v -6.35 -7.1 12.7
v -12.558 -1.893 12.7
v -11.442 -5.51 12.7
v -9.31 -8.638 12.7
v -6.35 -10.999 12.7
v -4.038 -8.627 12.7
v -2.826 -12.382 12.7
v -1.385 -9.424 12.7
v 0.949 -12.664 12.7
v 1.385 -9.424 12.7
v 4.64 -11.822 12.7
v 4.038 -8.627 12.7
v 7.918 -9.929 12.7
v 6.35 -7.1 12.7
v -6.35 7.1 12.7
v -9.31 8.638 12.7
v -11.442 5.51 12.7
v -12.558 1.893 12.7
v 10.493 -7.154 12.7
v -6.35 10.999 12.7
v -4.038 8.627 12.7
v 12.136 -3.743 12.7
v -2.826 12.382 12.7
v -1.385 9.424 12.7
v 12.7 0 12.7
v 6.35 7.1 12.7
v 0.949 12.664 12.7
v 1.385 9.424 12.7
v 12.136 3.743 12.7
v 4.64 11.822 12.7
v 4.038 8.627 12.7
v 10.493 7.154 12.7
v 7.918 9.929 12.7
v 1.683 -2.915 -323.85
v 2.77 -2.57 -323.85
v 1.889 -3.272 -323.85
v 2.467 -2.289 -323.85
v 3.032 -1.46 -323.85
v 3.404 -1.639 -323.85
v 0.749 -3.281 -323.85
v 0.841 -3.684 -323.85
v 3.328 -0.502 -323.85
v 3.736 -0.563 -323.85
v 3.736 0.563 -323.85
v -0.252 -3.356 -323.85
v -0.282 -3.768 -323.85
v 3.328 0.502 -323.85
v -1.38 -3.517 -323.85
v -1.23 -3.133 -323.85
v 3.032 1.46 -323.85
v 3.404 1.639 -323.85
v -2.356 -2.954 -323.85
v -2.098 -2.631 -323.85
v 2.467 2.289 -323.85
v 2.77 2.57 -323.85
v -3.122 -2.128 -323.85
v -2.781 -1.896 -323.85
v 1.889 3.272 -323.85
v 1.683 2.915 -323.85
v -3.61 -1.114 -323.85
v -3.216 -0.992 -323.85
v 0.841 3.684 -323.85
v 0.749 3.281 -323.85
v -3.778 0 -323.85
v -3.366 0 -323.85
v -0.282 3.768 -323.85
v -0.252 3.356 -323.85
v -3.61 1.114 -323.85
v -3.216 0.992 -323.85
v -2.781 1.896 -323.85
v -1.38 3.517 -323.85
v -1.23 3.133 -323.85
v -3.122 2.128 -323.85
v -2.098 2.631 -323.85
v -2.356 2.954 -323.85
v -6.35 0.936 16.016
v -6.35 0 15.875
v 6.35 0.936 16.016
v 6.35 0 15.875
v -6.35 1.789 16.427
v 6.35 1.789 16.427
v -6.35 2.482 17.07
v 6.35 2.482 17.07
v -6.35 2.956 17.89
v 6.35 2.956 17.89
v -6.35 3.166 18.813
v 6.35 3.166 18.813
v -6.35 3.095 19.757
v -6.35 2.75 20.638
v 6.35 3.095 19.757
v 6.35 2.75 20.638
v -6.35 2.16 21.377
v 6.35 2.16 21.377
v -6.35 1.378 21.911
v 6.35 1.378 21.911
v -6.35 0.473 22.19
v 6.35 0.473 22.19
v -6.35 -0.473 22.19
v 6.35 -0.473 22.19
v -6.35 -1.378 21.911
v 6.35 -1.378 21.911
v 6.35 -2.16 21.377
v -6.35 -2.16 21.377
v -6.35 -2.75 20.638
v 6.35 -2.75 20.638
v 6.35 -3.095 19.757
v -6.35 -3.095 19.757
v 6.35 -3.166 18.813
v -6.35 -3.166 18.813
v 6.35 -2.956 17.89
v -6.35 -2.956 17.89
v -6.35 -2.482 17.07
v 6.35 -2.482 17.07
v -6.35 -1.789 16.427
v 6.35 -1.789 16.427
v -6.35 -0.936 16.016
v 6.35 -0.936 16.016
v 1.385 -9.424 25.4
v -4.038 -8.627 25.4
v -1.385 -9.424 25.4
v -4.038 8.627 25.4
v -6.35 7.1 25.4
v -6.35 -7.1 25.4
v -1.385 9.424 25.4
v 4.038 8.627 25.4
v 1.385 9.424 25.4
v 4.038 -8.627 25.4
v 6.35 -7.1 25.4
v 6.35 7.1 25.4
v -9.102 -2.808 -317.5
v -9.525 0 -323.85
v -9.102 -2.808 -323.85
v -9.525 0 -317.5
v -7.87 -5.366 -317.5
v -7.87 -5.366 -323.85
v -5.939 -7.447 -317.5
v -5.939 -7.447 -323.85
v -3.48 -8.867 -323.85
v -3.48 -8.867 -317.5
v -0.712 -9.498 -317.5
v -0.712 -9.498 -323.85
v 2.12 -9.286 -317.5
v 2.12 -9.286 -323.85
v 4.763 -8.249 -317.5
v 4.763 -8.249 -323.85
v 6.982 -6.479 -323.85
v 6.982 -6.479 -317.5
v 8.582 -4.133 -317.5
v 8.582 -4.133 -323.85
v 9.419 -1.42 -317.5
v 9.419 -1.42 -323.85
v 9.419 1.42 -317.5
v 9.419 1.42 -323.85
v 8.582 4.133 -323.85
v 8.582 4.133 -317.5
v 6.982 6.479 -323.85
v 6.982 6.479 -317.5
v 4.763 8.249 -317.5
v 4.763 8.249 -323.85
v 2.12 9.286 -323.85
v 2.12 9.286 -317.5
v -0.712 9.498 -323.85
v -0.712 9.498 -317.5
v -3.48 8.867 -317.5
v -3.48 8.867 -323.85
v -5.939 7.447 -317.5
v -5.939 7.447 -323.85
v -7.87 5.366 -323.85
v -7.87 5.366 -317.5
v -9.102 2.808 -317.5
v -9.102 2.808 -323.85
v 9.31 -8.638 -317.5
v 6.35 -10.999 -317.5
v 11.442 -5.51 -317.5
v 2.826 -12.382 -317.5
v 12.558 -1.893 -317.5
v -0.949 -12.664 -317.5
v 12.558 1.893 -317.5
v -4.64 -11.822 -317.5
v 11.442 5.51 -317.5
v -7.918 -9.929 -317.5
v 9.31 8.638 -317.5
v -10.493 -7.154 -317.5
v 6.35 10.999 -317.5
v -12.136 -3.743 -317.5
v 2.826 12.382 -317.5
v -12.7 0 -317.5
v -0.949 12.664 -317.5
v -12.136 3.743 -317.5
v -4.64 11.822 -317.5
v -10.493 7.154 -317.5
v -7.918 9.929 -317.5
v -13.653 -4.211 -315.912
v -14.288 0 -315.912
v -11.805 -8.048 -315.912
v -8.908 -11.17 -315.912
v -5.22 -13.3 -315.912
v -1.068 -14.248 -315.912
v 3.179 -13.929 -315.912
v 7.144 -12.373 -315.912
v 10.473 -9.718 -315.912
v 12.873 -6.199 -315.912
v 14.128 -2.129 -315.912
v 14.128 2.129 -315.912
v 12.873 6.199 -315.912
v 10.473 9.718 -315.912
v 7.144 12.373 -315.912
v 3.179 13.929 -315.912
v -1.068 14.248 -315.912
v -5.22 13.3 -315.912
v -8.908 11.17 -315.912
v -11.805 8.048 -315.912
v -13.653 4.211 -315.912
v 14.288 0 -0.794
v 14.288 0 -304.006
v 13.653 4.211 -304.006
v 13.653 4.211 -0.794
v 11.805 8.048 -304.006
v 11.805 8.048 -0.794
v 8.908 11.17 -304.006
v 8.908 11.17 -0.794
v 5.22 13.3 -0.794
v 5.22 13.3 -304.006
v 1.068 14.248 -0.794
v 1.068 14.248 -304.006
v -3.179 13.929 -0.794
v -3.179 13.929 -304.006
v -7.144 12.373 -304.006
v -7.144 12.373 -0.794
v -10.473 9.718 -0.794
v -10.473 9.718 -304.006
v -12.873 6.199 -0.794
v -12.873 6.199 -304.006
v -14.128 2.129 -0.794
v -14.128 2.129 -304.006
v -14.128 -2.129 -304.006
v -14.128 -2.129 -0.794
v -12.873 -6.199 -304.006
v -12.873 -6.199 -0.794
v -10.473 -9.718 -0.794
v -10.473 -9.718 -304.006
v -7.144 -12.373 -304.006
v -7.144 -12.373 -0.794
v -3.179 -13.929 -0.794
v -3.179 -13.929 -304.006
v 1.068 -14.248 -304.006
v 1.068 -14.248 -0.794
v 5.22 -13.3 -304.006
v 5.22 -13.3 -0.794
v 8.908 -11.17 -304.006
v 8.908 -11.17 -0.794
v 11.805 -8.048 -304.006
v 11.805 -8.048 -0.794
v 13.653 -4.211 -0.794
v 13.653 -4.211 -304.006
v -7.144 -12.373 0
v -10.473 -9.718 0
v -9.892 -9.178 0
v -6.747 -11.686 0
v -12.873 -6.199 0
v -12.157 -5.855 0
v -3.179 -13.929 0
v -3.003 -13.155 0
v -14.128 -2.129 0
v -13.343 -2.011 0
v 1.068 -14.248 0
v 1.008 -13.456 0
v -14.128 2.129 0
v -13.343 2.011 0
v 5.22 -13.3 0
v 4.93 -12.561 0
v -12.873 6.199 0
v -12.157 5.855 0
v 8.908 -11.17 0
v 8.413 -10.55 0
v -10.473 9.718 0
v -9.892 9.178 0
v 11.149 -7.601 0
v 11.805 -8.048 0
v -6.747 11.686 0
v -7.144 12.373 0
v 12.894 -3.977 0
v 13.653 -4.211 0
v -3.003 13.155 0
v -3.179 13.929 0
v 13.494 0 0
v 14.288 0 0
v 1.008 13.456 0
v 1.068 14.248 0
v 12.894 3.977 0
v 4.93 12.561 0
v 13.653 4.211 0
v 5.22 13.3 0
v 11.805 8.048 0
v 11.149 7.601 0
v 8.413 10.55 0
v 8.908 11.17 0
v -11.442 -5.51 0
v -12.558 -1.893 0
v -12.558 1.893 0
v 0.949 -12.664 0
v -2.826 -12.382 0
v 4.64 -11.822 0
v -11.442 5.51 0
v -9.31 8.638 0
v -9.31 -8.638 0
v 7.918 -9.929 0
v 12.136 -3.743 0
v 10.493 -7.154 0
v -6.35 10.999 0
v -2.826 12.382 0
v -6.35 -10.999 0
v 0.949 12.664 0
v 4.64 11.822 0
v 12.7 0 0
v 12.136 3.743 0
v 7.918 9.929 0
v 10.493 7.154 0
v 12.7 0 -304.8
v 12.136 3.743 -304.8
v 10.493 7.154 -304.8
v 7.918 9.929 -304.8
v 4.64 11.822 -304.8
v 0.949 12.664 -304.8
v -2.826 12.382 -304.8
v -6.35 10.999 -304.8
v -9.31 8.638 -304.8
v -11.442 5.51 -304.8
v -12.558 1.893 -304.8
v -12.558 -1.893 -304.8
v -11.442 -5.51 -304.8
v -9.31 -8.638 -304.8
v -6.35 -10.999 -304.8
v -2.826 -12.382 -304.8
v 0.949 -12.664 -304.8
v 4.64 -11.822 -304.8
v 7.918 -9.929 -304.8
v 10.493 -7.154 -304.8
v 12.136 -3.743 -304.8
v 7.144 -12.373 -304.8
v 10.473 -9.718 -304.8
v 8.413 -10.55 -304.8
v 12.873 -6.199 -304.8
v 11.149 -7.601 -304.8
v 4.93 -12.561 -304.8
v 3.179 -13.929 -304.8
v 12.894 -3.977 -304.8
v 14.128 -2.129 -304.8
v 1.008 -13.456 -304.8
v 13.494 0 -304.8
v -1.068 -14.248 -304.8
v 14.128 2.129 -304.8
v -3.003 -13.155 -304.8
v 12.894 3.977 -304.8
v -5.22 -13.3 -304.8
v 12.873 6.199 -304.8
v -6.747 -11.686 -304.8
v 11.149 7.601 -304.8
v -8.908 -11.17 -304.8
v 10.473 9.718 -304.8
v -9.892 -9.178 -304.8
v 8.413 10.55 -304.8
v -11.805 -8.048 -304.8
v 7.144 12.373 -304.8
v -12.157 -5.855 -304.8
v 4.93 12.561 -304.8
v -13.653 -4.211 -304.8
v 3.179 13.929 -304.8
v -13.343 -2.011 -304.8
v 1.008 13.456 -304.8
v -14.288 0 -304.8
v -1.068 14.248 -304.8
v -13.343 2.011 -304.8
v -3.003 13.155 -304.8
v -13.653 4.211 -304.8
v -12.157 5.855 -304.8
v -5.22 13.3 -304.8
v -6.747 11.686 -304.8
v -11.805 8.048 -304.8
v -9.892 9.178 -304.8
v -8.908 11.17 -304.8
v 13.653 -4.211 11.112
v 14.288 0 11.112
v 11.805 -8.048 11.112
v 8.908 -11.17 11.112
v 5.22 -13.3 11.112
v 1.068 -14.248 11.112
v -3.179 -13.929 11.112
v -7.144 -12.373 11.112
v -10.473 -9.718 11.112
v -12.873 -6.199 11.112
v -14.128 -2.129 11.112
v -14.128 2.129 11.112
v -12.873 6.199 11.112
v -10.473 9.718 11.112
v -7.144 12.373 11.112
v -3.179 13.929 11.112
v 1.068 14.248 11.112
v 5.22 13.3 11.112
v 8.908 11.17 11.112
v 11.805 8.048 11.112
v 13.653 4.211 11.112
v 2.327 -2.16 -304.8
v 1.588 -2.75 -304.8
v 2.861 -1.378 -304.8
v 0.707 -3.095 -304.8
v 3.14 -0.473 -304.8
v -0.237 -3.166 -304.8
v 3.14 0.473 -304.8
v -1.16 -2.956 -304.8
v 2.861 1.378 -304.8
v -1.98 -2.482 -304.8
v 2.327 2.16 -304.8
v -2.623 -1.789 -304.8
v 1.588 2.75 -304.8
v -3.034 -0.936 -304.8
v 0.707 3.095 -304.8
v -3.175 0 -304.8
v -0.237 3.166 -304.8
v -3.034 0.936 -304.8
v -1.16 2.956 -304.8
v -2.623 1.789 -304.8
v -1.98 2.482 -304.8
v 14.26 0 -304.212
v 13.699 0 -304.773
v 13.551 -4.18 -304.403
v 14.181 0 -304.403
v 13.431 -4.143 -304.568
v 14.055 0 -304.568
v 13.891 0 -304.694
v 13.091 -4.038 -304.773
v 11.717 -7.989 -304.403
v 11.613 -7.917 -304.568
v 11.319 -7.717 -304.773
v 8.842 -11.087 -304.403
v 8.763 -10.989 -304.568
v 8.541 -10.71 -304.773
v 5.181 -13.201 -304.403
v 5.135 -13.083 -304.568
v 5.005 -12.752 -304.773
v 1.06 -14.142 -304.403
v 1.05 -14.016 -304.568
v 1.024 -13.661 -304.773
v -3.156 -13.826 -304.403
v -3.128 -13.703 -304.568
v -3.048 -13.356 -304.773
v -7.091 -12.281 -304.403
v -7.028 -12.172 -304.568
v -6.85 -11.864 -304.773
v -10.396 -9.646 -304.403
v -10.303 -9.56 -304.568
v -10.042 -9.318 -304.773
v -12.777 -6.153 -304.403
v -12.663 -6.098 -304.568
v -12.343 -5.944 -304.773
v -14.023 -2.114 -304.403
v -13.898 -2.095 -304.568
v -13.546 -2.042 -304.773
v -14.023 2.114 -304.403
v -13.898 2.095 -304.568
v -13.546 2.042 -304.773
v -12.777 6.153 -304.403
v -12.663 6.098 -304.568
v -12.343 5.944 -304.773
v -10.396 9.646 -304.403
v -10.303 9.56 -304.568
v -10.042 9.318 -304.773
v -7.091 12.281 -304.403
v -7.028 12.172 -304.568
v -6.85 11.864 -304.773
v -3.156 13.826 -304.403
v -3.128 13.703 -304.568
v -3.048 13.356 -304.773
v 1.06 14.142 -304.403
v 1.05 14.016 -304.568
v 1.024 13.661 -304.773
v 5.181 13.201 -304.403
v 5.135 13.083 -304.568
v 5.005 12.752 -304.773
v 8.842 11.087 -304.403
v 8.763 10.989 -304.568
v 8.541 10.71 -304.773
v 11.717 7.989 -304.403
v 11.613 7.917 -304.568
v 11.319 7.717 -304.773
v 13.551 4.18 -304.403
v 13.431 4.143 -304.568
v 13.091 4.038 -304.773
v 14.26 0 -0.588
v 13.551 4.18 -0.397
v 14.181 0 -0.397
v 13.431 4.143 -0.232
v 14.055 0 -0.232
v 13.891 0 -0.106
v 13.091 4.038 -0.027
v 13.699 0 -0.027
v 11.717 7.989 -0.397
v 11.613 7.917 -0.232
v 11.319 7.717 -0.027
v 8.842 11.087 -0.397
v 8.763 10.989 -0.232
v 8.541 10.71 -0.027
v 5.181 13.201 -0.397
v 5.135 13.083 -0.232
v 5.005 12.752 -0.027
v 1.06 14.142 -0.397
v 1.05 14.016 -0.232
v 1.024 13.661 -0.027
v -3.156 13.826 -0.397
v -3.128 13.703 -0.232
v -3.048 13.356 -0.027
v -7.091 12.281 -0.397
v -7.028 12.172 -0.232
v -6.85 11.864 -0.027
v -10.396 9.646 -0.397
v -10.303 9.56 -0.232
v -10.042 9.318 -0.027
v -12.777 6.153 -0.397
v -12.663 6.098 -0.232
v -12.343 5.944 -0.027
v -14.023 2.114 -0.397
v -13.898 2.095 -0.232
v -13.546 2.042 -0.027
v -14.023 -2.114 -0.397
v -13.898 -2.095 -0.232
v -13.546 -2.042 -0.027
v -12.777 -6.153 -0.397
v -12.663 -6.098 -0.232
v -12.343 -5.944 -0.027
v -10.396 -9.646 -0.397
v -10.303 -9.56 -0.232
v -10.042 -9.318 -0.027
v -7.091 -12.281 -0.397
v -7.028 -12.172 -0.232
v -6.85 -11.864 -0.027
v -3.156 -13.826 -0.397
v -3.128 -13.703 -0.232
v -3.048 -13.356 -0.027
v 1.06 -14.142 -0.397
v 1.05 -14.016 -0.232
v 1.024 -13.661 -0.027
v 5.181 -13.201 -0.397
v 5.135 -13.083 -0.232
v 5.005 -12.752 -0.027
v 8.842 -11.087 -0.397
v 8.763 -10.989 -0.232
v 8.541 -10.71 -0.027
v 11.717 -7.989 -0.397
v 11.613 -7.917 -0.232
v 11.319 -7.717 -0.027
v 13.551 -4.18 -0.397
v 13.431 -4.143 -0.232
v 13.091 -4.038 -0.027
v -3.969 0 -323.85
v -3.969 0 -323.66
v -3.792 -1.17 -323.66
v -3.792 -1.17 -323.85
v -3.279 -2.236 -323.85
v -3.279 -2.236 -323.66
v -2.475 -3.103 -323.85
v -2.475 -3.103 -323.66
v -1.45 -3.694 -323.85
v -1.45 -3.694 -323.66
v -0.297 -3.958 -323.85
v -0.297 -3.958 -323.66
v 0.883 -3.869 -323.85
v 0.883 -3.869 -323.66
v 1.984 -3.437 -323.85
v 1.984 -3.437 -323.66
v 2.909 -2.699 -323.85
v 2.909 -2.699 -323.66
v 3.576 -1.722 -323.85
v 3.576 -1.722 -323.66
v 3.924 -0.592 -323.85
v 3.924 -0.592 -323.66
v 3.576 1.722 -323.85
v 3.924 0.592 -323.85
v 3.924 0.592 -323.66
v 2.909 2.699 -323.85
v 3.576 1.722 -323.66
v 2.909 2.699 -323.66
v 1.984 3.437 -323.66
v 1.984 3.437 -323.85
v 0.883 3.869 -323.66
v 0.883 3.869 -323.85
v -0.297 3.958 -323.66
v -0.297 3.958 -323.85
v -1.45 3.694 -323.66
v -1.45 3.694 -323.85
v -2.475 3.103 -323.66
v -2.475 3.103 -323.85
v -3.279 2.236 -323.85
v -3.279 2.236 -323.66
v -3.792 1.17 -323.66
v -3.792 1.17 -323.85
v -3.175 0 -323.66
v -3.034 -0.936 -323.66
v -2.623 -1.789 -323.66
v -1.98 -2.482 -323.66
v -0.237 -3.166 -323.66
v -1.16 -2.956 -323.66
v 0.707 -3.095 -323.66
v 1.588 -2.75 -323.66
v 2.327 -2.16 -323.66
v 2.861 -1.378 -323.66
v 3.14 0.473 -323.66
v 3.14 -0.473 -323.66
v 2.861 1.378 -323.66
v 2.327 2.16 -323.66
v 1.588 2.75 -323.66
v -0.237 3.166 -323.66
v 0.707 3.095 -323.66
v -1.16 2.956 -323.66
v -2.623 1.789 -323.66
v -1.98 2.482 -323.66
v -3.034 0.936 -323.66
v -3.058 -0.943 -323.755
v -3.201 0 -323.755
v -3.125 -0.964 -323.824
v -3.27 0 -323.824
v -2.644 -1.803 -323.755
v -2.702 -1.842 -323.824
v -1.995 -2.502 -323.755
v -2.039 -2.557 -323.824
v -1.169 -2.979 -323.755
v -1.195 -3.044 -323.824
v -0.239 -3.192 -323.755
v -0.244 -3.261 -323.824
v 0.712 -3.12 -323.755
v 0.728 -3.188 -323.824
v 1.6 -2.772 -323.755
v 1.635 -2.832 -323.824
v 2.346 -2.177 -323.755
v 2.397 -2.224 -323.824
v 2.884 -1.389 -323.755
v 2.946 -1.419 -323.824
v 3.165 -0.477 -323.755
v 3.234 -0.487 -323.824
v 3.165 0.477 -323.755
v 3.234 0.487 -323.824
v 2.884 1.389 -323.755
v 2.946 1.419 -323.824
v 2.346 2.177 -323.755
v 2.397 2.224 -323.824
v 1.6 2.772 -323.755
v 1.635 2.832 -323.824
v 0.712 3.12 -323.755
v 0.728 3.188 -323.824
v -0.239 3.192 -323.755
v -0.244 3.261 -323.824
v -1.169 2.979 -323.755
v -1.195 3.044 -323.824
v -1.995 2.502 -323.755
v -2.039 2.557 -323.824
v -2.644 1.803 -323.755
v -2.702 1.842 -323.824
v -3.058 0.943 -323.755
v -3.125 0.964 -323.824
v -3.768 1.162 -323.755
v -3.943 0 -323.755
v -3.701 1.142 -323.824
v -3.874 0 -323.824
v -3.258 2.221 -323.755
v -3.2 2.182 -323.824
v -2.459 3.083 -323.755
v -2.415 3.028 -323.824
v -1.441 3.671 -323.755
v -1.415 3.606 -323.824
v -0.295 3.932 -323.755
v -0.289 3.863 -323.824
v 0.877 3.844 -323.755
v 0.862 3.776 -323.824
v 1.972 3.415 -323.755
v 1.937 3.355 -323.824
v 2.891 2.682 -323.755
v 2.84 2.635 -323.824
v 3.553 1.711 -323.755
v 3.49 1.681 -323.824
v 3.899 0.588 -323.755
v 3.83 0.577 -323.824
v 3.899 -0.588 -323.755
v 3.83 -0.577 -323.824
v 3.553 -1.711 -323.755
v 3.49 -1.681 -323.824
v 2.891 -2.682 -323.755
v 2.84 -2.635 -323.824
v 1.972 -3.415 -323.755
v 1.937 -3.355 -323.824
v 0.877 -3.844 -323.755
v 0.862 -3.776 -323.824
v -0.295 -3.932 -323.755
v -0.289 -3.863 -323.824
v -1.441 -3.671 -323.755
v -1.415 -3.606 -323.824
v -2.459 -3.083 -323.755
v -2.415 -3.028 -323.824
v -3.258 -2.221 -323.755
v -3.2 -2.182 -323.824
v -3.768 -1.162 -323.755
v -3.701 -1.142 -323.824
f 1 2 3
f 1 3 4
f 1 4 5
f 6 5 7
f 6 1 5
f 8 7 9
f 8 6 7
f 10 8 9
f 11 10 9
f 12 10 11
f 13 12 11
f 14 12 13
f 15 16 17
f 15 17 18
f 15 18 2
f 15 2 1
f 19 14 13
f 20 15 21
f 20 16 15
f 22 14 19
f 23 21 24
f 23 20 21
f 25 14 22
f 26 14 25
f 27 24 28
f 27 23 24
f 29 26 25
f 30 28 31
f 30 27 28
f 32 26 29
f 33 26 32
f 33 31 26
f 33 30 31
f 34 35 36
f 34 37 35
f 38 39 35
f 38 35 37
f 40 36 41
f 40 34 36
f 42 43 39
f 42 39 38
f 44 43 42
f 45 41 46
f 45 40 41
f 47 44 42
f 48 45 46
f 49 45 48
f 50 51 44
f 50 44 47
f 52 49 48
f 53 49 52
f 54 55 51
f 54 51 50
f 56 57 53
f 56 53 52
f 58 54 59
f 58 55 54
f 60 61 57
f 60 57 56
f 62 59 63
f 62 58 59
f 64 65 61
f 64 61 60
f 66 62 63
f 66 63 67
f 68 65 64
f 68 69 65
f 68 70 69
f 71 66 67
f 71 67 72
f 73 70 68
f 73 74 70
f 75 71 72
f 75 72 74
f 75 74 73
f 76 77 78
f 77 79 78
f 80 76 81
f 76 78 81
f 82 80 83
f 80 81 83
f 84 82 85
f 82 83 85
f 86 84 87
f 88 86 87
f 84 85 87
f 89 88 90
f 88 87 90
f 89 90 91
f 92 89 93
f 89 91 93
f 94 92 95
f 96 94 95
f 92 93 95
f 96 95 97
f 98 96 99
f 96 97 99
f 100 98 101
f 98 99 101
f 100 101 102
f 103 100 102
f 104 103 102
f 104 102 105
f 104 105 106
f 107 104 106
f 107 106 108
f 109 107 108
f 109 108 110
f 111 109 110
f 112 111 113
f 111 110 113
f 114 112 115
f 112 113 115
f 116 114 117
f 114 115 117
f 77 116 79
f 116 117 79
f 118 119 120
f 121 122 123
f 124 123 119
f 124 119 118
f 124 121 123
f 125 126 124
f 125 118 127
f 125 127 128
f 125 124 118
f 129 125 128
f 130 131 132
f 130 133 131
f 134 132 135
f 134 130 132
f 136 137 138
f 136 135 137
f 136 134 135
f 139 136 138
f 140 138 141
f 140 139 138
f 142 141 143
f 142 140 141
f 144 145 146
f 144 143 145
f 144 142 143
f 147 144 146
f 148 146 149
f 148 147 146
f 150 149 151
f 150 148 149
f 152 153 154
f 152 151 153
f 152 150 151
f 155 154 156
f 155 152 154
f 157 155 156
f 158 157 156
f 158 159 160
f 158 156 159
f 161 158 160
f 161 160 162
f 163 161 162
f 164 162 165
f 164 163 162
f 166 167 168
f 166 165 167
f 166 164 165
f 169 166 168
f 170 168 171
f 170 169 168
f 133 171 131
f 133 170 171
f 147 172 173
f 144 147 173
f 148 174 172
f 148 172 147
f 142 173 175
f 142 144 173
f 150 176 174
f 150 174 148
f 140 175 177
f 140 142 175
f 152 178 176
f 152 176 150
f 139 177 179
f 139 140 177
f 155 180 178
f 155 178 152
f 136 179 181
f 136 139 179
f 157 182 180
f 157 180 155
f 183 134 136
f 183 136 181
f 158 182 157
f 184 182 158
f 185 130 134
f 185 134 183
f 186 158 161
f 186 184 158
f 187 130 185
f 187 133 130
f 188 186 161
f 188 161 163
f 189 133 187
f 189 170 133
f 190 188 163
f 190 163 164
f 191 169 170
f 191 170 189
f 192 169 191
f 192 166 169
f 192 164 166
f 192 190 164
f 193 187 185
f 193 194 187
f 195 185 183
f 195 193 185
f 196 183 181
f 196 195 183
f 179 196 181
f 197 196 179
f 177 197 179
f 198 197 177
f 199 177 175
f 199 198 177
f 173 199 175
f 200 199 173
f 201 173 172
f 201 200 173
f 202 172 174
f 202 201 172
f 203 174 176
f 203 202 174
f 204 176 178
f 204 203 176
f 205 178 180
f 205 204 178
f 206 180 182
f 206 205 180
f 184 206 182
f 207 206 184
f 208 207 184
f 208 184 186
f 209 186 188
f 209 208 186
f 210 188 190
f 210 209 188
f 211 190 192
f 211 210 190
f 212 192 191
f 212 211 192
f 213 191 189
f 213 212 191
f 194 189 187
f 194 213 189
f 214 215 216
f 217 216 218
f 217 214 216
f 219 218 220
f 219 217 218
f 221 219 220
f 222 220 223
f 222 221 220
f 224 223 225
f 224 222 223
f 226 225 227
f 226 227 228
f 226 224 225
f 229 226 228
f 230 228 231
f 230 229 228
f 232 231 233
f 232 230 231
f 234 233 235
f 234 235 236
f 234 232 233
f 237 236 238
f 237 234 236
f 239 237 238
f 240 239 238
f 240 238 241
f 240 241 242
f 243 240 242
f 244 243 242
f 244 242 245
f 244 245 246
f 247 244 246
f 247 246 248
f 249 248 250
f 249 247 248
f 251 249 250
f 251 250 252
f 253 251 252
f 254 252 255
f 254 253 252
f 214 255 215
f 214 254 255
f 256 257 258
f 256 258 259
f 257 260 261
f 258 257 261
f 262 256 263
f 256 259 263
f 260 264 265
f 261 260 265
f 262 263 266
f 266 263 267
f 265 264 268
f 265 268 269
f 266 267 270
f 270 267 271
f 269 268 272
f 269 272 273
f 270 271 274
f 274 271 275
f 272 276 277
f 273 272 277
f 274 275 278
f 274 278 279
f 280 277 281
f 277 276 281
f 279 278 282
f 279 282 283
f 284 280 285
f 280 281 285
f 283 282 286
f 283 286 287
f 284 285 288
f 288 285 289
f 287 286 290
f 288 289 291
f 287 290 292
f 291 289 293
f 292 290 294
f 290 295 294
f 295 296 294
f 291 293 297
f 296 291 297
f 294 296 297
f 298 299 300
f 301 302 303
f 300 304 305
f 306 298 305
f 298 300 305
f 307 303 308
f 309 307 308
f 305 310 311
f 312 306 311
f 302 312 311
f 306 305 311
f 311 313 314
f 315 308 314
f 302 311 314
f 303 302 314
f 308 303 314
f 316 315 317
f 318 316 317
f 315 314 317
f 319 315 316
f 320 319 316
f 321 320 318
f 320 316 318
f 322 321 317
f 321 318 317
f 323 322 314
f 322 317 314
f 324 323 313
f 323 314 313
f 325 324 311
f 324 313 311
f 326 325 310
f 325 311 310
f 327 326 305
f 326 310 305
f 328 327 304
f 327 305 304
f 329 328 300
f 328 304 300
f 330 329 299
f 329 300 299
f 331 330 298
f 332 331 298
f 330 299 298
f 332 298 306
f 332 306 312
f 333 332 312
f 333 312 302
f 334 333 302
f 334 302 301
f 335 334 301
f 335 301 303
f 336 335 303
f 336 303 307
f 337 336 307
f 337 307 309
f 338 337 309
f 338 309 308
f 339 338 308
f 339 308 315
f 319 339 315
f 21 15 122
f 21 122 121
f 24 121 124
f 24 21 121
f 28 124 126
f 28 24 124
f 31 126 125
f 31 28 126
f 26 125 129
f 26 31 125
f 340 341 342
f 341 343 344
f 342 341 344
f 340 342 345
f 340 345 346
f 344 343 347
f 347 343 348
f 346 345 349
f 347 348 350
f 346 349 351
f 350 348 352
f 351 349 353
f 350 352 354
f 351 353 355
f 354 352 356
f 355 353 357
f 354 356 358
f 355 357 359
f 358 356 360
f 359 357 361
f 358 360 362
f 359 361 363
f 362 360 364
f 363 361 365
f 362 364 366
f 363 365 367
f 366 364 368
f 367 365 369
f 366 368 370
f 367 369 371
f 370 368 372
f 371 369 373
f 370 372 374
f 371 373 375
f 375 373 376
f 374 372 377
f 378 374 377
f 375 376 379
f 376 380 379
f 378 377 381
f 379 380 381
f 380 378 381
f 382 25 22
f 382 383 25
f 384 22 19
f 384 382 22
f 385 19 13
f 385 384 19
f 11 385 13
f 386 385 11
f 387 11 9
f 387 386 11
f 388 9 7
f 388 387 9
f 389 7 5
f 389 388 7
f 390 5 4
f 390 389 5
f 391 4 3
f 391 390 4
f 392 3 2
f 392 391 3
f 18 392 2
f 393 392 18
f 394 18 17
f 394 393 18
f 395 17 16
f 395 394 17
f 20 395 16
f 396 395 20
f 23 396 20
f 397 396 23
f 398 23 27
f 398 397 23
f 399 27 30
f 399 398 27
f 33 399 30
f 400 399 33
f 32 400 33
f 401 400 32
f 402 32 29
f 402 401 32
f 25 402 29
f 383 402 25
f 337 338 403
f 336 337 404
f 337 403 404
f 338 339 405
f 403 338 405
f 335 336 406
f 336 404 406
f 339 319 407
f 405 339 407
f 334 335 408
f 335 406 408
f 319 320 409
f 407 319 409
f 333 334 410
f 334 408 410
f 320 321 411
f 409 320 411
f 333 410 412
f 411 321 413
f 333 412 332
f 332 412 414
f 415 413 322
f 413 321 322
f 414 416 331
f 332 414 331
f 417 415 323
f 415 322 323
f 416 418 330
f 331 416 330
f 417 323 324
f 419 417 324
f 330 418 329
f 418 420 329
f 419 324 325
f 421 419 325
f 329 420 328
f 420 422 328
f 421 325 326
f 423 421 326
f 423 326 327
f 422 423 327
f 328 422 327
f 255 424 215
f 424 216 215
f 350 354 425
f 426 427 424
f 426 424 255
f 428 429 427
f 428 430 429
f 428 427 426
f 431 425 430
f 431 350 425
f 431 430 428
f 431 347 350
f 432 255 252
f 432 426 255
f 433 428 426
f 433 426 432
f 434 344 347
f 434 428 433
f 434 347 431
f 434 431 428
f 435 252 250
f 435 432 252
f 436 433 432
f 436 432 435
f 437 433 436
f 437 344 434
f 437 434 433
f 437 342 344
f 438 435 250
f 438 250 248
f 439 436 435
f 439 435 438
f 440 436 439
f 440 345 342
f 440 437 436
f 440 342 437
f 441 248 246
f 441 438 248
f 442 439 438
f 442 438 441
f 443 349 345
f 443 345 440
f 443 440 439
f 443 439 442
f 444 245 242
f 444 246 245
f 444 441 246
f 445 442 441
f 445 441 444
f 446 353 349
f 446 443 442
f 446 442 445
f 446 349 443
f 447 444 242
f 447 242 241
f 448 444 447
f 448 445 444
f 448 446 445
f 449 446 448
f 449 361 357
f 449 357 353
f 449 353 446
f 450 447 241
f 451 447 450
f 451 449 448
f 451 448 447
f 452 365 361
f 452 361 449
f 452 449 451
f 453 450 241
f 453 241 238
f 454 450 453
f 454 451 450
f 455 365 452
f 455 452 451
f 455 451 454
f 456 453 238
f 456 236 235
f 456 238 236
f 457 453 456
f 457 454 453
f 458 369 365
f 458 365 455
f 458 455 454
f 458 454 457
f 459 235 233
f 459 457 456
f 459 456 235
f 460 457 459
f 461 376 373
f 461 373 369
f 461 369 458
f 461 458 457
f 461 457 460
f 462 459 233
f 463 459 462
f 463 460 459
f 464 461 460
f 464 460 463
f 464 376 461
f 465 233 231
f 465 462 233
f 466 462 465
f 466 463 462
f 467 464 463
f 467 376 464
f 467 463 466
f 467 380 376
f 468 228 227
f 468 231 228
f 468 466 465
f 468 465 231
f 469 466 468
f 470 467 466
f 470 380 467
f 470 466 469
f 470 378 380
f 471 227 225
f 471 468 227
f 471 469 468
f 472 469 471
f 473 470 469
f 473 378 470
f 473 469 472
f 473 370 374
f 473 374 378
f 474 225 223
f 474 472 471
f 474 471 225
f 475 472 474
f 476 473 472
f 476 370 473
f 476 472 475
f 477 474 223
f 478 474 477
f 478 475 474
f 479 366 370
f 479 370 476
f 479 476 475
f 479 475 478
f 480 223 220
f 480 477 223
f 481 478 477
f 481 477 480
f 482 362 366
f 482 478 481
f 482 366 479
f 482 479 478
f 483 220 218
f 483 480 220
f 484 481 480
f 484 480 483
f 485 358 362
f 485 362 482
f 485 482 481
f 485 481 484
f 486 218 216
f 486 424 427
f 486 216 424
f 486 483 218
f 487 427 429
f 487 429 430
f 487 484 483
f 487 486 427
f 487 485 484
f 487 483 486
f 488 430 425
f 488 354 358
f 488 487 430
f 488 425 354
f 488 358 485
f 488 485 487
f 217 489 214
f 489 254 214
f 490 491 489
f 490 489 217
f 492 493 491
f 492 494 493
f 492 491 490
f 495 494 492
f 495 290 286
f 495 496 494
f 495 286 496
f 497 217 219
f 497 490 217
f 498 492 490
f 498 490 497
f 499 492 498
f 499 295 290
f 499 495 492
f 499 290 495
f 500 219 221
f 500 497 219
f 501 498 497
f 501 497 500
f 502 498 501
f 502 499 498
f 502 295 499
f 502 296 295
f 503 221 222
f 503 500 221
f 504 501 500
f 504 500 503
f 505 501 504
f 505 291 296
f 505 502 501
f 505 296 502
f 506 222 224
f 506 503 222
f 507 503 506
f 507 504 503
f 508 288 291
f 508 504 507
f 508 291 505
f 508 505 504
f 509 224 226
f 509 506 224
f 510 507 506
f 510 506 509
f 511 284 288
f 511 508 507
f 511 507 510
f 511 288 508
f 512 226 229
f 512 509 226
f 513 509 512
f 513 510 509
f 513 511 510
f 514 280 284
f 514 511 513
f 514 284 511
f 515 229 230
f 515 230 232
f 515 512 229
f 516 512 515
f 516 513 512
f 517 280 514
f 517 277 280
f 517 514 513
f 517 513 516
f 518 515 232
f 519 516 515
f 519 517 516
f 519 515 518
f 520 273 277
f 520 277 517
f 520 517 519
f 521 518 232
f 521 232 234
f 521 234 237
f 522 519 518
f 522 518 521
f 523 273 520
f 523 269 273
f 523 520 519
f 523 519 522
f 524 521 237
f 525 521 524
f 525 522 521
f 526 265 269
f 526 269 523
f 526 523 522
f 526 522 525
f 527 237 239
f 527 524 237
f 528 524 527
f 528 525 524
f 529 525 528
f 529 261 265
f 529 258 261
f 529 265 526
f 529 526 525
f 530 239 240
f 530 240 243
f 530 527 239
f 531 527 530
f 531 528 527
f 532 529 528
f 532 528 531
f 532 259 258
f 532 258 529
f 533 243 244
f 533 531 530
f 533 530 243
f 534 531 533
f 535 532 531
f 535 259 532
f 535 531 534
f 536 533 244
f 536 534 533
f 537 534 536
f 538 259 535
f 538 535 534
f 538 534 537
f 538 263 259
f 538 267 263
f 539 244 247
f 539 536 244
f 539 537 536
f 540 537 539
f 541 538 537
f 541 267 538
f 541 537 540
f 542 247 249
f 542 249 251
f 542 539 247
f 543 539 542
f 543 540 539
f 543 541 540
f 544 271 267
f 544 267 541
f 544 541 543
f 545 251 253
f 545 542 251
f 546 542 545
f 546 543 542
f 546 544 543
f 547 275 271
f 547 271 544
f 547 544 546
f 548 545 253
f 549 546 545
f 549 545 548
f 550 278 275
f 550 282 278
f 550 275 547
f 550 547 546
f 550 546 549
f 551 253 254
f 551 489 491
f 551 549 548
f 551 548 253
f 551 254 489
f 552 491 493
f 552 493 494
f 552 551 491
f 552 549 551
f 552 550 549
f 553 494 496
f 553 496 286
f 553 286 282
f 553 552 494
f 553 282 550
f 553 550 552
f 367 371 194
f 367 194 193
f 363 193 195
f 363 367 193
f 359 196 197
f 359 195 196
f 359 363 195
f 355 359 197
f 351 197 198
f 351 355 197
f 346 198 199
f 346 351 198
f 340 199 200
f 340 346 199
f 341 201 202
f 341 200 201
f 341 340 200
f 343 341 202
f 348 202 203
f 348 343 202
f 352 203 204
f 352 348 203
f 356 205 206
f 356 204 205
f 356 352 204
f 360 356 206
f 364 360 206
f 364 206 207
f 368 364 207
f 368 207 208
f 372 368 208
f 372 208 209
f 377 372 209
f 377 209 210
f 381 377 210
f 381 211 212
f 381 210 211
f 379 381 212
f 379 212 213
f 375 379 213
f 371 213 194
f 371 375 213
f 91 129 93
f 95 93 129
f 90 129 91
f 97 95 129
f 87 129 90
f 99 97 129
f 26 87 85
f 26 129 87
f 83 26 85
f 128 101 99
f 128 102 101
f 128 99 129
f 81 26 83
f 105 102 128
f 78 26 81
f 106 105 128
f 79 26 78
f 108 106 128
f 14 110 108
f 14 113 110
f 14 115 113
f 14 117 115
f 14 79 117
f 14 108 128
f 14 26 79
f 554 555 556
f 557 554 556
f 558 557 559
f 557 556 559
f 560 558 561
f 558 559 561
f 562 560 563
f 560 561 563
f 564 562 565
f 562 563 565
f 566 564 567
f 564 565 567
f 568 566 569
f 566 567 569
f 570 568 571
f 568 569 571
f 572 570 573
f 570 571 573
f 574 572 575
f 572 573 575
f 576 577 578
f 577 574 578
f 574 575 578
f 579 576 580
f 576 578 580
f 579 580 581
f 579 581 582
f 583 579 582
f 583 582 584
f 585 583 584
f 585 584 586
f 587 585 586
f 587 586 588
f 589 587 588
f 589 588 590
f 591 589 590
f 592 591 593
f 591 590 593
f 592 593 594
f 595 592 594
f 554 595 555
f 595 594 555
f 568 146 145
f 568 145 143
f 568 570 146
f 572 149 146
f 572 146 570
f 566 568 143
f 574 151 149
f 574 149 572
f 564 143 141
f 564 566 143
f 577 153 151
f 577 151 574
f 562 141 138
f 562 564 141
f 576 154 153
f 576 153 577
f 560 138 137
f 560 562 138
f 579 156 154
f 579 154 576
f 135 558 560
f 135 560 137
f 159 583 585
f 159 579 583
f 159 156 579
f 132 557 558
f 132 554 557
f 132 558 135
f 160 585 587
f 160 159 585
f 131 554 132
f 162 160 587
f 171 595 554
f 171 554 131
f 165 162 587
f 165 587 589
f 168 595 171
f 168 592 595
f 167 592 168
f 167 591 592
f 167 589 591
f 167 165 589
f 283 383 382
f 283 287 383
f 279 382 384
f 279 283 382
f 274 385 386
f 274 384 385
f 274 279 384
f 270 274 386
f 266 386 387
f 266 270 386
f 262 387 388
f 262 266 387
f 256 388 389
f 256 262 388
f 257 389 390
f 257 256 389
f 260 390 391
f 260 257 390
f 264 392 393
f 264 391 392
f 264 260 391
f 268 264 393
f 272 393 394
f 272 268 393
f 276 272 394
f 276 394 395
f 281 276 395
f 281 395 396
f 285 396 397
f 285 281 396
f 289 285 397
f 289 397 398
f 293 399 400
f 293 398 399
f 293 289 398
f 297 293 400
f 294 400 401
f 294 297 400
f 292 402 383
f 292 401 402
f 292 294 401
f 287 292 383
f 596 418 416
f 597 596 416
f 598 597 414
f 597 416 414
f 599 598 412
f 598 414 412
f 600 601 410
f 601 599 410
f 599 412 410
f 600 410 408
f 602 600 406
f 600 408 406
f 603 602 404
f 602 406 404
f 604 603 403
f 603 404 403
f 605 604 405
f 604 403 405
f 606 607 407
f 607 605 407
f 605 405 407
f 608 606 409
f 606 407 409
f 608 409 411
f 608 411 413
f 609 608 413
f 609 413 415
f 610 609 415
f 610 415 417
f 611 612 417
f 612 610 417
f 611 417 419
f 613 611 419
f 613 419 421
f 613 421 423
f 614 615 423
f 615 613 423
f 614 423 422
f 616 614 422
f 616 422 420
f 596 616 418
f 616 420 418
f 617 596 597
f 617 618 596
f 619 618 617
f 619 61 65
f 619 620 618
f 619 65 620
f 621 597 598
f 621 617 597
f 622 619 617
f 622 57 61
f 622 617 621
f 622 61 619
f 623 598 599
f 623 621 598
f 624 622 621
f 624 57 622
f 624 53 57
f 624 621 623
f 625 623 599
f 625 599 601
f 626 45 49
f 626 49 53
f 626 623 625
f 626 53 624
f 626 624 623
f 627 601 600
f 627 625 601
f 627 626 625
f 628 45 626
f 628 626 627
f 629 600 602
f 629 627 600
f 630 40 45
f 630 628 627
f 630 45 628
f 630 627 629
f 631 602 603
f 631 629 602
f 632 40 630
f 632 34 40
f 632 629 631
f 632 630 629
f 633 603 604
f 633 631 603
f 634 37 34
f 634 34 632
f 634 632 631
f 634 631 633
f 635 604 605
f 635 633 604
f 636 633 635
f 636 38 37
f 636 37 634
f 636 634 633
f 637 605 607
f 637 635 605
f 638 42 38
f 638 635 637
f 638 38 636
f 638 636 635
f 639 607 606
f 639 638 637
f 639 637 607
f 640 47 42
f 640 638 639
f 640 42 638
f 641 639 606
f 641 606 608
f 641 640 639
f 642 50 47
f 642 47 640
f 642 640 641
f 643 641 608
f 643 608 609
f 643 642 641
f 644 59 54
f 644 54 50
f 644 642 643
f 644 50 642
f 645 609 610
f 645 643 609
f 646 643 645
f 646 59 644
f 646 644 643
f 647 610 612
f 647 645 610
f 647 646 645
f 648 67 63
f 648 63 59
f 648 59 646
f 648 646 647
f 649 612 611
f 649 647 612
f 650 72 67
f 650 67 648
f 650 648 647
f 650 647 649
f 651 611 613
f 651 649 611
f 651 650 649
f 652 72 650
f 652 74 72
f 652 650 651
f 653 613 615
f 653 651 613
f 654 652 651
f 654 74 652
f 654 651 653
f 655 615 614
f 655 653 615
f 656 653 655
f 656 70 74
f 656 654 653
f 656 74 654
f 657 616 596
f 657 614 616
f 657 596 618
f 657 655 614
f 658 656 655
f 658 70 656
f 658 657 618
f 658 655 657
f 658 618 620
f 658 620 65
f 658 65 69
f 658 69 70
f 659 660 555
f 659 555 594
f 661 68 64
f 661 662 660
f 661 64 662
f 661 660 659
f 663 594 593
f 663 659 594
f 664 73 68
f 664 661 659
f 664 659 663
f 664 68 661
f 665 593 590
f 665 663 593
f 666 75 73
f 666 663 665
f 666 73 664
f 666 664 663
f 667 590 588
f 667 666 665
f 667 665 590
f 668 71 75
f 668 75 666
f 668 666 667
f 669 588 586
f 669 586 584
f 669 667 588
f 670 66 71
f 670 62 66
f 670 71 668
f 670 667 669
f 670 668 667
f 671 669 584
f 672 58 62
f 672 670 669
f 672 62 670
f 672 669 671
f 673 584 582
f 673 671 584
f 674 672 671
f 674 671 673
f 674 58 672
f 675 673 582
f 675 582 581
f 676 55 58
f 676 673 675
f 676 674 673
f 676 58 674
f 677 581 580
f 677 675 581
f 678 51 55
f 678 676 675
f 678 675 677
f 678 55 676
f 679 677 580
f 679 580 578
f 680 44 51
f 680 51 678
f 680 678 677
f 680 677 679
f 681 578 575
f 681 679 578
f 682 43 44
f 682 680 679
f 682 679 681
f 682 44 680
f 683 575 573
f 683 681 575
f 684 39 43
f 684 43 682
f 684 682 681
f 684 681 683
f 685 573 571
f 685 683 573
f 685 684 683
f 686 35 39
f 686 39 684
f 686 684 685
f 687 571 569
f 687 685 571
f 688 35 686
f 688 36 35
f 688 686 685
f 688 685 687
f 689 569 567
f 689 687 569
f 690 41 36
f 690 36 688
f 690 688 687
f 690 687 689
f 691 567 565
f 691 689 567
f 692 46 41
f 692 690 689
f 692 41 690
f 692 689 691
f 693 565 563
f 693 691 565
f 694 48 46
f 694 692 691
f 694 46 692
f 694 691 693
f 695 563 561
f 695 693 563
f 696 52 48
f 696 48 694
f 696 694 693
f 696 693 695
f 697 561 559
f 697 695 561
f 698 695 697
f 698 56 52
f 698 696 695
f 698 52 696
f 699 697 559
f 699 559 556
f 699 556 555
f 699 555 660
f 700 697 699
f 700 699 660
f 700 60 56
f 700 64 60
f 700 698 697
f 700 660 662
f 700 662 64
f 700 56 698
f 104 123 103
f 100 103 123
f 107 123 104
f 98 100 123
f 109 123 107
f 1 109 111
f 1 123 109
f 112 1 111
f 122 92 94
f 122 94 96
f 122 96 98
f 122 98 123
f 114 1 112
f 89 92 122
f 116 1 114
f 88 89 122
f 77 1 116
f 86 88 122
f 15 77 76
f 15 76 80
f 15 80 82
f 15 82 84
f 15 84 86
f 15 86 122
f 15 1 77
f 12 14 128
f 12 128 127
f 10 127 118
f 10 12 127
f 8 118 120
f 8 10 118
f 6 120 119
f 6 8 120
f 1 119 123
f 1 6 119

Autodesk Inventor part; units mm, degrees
ref_plane "YZ Plane" through (0, 0, 0) normal (1, 0, 0) x (0, 1, 0)
ref_plane "XZ Plane" through (0, 0, 0) normal (0, 1, 0) x (-1, 0, 0)
ref_plane "XY Plane" through (0, 0, 0) normal (0, 0, 1) x (1, 0, 0)
sketch "Sketch1" plane through (0, 0, 0) normal (0, 0, 1) x (1, 0, 0)
  circle A0 centre (0, 0) radius 12.7
  circle A1 centre (0, 0) radius 14.2875
  line L0 (-6.35, 7.0995) -> (6.35, 7.0995)
  line L1 (6.35, 7.0995) -> (6.35, -7.0995)
  line L2 (6.35, -7.0995) -> (-6.35, -7.0995)
  line L3 (-6.35, -7.0995) -> (-6.35, 7.0995)
  arc A2 (6.35, 7.0995) -> (-6.35, 7.0995) centre (0, 0) ccw
  arc A3 (-6.35, -7.0995) -> (6.35, -7.0995) centre (0, 0) ccw
  dimension "d2" = 25.4
  dimension "d3" = 28.575
  dimension "d4" = 12.7
  dimension "d5" = 6.35
  dimension "d6" = 14.199
  dimension "d7" = 7.0995
  dimension "d8" = 9.525
extrude "Extrusion1" add sketch "Sketch1" against normal blind 304.8 contours A1
fillet "Fillet1" radius 0.7937 2 edges at (-14.2875, 0, 0) (-14.2875, 0, -304.8)
extrude "Extrusion2" add sketch "Sketch1" along normal blind 12.7 contours A0 | A1
extrude "Extrusion3" add sketch "Sketch1" along normal blind 25.4 contours A2 L0 | L0 L1 L2 L3 | L2 A3
chamfer "Chamfer1" distance 1.5875 angle 45 1 edges at (-14.2875, 0, 12.7)
thread "Thread1" size "3/4-10 UNC" class "2A" standard "ANSI Unified Screw Threads" full length
thread "Thread2" size "3/4-10 UNC" class "2A" standard "ANSI Unified Screw Threads" full length
sketch "Sketch2" plane through (0, 0, -304.8) normal (0, 0, -1) x (-1, 0, 0)
  circle A0 centre (0, 0) radius 14.2875 projected
  circle A1 centre (0, 0) radius 9.525
  circle A2 centre (0, 0) radius 3.175
  circle A3 centre (0, 0) radius 3.9688
  dimension "d24" = 19.05
  dimension "d25" = 7.9375
  dimension "d26" = 6.35
extrude "Extrusion4" add sketch "Sketch2" along normal blind 12.7 contours A0
extrude "Extrusion5" add sketch "Sketch2" along normal blind 19.05 contours A3
fillet "Fillet2" radius 0.1905 2 edges at (3.9688, 0, -323.85) (3.175, 0, -323.85)
extrude "Extrusion6" add sketch "Sketch2" along normal blind 19.05 contours A1
chamfer "Chamfer2" distance 1.5875 angle 45 1 edges at (14.2875, 0, -317.5)
thread "Thread3" size "3/4-10 UNC" class "2A" standard "ANSI Unified Screw Threads" full length
sketch "Sketch3" plane through (6.35, -7.0995, 12.7) normal (1, 0, 0) x (0, 0, -1)
  line L0 (0, 14.199) -> (-12.7, 14.199) projected
  line L1 (-12.7, 14.199) -> (-12.7, 0) projected
  line L2 (0, 0) -> (-12.7, 0) projected
  circle A0 centre (-6.35, 7.0995) radius 3.175
  point P0 (12.7, 7.0995)
  dimension "d39" = 6.35
  dimension "d40" = 7.0995
  dimension "d41" = 14.199
  dimension "d42" = 6.35
extrude "Extrusion7" cut sketch "Sketch3" against normal blind 25.4
equation "\"d5\" = 0.5 * d4"
equation "\"d7\" = 0.5 * d6"
equation "\"d40\" = 0.5 * d41"
properties part number "1' by 1'' dia piston"
